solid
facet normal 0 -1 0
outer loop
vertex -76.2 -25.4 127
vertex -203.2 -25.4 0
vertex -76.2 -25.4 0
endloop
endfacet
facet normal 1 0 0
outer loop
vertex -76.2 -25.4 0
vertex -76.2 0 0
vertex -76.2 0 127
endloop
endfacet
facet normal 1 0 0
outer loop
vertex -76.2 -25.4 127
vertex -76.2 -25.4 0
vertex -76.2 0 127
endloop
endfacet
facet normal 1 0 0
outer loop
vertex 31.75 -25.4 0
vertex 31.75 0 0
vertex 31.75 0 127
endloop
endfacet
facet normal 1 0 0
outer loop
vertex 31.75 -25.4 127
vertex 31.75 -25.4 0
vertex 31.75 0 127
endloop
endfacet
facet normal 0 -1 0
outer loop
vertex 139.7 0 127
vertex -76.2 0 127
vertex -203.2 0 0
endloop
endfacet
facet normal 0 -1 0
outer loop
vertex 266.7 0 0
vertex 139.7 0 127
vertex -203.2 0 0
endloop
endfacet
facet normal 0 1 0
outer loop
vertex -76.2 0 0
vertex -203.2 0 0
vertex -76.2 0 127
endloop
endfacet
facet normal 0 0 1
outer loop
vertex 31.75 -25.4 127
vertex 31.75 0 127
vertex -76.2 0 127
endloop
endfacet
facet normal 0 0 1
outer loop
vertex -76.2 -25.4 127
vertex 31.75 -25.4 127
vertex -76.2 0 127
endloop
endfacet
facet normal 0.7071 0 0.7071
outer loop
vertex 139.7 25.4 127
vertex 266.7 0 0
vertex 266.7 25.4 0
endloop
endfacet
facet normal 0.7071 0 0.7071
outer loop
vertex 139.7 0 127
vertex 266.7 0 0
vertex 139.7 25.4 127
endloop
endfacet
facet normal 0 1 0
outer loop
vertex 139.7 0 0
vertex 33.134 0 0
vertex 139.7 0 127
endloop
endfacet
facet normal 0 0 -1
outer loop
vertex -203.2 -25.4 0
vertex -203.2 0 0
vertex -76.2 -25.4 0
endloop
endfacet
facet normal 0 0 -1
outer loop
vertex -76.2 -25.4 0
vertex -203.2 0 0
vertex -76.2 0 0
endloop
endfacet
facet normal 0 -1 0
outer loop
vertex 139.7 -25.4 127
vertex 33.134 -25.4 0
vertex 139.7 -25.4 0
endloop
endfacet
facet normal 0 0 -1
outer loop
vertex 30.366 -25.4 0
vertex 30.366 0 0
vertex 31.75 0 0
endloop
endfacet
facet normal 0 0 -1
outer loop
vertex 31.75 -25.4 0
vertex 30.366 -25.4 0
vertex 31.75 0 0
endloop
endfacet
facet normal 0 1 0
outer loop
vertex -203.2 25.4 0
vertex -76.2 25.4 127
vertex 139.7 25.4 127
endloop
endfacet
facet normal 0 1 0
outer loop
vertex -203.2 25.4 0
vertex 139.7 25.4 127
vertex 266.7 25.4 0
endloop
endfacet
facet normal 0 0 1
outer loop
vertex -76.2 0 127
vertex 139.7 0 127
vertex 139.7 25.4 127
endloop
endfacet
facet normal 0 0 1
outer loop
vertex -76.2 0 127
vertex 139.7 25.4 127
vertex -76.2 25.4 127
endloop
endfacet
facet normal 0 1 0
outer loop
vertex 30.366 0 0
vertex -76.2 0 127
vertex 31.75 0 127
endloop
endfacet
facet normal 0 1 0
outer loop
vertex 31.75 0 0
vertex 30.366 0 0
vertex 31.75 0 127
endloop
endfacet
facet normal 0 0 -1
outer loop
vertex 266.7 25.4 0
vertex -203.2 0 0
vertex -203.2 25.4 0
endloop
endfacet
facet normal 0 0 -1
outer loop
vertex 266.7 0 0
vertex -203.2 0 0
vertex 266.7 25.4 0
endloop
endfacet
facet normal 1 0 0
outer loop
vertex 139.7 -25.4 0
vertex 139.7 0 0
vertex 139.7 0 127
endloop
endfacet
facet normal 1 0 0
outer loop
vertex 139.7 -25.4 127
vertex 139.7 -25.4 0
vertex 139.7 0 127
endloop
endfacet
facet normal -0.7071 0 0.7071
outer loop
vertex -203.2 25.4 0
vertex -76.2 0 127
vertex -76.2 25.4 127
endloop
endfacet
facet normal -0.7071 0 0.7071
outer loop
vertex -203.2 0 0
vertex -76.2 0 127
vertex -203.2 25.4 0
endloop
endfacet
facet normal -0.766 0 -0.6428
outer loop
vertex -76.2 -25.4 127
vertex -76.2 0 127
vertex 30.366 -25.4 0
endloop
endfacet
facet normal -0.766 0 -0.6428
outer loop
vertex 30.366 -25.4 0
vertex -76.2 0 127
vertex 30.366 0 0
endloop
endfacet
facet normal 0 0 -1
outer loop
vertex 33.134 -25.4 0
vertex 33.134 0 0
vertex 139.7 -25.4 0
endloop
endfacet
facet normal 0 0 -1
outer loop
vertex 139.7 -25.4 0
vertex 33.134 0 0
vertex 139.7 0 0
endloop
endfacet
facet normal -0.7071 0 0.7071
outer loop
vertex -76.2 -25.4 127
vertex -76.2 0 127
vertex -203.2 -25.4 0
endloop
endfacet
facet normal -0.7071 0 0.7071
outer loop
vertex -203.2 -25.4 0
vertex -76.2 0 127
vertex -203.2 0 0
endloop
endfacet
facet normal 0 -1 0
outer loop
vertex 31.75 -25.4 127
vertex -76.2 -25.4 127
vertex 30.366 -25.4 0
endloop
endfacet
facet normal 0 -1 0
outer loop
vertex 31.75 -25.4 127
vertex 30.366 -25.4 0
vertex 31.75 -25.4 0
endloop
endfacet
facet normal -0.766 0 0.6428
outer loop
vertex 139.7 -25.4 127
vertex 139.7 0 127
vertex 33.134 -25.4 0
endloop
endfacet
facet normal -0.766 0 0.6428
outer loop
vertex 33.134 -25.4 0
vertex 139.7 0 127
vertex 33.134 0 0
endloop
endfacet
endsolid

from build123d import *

# Parameters (mm, degrees)
F1_DEPTH = 25.4
F2_DEPTH = 25.4


with BuildPart() as f1:
    # F0 (on Front) → F1 (new body)
    with BuildSketch(Plane.XZ):
        Polygon((-76.2, 127), (-203.2, 0), (-76.2, 0), align=None)
        Polygon((31.75, 127), (-76.2, 127), (30.365653, 0), (31.75, 0), align=None)
        Polygon((139.7, 0), (139.7, 127), (33.134347, 0), align=None)
    extrude(amount=F1_DEPTH)


with BuildPart() as f2:
    # F0 (on Front) → F2 (new body)
    with BuildSketch(Plane.XZ):
        Polygon((-76.2, 127), (-203.2, 0), (-76.2, 0), align=None)
        Polygon((-76.2, 127), (-76.2, 0), (30.365653, 0), align=None)
        Polygon((31.75, 127), (-76.2, 127), (30.365653, 0), (31.75, 0), align=None)
        Polygon((139.7, 127), (31.75, 127), (31.75, 0), (33.134347, 0), align=None)
        Polygon((266.7, 0), (139.7, 127), (139.7, 0), align=None)
        Polygon((139.7, 0), (139.7, 127), (33.134347, 0), align=None)
    extrude(amount=-F2_DEPTH)


solid = Compound([f1.part, f2.part])
